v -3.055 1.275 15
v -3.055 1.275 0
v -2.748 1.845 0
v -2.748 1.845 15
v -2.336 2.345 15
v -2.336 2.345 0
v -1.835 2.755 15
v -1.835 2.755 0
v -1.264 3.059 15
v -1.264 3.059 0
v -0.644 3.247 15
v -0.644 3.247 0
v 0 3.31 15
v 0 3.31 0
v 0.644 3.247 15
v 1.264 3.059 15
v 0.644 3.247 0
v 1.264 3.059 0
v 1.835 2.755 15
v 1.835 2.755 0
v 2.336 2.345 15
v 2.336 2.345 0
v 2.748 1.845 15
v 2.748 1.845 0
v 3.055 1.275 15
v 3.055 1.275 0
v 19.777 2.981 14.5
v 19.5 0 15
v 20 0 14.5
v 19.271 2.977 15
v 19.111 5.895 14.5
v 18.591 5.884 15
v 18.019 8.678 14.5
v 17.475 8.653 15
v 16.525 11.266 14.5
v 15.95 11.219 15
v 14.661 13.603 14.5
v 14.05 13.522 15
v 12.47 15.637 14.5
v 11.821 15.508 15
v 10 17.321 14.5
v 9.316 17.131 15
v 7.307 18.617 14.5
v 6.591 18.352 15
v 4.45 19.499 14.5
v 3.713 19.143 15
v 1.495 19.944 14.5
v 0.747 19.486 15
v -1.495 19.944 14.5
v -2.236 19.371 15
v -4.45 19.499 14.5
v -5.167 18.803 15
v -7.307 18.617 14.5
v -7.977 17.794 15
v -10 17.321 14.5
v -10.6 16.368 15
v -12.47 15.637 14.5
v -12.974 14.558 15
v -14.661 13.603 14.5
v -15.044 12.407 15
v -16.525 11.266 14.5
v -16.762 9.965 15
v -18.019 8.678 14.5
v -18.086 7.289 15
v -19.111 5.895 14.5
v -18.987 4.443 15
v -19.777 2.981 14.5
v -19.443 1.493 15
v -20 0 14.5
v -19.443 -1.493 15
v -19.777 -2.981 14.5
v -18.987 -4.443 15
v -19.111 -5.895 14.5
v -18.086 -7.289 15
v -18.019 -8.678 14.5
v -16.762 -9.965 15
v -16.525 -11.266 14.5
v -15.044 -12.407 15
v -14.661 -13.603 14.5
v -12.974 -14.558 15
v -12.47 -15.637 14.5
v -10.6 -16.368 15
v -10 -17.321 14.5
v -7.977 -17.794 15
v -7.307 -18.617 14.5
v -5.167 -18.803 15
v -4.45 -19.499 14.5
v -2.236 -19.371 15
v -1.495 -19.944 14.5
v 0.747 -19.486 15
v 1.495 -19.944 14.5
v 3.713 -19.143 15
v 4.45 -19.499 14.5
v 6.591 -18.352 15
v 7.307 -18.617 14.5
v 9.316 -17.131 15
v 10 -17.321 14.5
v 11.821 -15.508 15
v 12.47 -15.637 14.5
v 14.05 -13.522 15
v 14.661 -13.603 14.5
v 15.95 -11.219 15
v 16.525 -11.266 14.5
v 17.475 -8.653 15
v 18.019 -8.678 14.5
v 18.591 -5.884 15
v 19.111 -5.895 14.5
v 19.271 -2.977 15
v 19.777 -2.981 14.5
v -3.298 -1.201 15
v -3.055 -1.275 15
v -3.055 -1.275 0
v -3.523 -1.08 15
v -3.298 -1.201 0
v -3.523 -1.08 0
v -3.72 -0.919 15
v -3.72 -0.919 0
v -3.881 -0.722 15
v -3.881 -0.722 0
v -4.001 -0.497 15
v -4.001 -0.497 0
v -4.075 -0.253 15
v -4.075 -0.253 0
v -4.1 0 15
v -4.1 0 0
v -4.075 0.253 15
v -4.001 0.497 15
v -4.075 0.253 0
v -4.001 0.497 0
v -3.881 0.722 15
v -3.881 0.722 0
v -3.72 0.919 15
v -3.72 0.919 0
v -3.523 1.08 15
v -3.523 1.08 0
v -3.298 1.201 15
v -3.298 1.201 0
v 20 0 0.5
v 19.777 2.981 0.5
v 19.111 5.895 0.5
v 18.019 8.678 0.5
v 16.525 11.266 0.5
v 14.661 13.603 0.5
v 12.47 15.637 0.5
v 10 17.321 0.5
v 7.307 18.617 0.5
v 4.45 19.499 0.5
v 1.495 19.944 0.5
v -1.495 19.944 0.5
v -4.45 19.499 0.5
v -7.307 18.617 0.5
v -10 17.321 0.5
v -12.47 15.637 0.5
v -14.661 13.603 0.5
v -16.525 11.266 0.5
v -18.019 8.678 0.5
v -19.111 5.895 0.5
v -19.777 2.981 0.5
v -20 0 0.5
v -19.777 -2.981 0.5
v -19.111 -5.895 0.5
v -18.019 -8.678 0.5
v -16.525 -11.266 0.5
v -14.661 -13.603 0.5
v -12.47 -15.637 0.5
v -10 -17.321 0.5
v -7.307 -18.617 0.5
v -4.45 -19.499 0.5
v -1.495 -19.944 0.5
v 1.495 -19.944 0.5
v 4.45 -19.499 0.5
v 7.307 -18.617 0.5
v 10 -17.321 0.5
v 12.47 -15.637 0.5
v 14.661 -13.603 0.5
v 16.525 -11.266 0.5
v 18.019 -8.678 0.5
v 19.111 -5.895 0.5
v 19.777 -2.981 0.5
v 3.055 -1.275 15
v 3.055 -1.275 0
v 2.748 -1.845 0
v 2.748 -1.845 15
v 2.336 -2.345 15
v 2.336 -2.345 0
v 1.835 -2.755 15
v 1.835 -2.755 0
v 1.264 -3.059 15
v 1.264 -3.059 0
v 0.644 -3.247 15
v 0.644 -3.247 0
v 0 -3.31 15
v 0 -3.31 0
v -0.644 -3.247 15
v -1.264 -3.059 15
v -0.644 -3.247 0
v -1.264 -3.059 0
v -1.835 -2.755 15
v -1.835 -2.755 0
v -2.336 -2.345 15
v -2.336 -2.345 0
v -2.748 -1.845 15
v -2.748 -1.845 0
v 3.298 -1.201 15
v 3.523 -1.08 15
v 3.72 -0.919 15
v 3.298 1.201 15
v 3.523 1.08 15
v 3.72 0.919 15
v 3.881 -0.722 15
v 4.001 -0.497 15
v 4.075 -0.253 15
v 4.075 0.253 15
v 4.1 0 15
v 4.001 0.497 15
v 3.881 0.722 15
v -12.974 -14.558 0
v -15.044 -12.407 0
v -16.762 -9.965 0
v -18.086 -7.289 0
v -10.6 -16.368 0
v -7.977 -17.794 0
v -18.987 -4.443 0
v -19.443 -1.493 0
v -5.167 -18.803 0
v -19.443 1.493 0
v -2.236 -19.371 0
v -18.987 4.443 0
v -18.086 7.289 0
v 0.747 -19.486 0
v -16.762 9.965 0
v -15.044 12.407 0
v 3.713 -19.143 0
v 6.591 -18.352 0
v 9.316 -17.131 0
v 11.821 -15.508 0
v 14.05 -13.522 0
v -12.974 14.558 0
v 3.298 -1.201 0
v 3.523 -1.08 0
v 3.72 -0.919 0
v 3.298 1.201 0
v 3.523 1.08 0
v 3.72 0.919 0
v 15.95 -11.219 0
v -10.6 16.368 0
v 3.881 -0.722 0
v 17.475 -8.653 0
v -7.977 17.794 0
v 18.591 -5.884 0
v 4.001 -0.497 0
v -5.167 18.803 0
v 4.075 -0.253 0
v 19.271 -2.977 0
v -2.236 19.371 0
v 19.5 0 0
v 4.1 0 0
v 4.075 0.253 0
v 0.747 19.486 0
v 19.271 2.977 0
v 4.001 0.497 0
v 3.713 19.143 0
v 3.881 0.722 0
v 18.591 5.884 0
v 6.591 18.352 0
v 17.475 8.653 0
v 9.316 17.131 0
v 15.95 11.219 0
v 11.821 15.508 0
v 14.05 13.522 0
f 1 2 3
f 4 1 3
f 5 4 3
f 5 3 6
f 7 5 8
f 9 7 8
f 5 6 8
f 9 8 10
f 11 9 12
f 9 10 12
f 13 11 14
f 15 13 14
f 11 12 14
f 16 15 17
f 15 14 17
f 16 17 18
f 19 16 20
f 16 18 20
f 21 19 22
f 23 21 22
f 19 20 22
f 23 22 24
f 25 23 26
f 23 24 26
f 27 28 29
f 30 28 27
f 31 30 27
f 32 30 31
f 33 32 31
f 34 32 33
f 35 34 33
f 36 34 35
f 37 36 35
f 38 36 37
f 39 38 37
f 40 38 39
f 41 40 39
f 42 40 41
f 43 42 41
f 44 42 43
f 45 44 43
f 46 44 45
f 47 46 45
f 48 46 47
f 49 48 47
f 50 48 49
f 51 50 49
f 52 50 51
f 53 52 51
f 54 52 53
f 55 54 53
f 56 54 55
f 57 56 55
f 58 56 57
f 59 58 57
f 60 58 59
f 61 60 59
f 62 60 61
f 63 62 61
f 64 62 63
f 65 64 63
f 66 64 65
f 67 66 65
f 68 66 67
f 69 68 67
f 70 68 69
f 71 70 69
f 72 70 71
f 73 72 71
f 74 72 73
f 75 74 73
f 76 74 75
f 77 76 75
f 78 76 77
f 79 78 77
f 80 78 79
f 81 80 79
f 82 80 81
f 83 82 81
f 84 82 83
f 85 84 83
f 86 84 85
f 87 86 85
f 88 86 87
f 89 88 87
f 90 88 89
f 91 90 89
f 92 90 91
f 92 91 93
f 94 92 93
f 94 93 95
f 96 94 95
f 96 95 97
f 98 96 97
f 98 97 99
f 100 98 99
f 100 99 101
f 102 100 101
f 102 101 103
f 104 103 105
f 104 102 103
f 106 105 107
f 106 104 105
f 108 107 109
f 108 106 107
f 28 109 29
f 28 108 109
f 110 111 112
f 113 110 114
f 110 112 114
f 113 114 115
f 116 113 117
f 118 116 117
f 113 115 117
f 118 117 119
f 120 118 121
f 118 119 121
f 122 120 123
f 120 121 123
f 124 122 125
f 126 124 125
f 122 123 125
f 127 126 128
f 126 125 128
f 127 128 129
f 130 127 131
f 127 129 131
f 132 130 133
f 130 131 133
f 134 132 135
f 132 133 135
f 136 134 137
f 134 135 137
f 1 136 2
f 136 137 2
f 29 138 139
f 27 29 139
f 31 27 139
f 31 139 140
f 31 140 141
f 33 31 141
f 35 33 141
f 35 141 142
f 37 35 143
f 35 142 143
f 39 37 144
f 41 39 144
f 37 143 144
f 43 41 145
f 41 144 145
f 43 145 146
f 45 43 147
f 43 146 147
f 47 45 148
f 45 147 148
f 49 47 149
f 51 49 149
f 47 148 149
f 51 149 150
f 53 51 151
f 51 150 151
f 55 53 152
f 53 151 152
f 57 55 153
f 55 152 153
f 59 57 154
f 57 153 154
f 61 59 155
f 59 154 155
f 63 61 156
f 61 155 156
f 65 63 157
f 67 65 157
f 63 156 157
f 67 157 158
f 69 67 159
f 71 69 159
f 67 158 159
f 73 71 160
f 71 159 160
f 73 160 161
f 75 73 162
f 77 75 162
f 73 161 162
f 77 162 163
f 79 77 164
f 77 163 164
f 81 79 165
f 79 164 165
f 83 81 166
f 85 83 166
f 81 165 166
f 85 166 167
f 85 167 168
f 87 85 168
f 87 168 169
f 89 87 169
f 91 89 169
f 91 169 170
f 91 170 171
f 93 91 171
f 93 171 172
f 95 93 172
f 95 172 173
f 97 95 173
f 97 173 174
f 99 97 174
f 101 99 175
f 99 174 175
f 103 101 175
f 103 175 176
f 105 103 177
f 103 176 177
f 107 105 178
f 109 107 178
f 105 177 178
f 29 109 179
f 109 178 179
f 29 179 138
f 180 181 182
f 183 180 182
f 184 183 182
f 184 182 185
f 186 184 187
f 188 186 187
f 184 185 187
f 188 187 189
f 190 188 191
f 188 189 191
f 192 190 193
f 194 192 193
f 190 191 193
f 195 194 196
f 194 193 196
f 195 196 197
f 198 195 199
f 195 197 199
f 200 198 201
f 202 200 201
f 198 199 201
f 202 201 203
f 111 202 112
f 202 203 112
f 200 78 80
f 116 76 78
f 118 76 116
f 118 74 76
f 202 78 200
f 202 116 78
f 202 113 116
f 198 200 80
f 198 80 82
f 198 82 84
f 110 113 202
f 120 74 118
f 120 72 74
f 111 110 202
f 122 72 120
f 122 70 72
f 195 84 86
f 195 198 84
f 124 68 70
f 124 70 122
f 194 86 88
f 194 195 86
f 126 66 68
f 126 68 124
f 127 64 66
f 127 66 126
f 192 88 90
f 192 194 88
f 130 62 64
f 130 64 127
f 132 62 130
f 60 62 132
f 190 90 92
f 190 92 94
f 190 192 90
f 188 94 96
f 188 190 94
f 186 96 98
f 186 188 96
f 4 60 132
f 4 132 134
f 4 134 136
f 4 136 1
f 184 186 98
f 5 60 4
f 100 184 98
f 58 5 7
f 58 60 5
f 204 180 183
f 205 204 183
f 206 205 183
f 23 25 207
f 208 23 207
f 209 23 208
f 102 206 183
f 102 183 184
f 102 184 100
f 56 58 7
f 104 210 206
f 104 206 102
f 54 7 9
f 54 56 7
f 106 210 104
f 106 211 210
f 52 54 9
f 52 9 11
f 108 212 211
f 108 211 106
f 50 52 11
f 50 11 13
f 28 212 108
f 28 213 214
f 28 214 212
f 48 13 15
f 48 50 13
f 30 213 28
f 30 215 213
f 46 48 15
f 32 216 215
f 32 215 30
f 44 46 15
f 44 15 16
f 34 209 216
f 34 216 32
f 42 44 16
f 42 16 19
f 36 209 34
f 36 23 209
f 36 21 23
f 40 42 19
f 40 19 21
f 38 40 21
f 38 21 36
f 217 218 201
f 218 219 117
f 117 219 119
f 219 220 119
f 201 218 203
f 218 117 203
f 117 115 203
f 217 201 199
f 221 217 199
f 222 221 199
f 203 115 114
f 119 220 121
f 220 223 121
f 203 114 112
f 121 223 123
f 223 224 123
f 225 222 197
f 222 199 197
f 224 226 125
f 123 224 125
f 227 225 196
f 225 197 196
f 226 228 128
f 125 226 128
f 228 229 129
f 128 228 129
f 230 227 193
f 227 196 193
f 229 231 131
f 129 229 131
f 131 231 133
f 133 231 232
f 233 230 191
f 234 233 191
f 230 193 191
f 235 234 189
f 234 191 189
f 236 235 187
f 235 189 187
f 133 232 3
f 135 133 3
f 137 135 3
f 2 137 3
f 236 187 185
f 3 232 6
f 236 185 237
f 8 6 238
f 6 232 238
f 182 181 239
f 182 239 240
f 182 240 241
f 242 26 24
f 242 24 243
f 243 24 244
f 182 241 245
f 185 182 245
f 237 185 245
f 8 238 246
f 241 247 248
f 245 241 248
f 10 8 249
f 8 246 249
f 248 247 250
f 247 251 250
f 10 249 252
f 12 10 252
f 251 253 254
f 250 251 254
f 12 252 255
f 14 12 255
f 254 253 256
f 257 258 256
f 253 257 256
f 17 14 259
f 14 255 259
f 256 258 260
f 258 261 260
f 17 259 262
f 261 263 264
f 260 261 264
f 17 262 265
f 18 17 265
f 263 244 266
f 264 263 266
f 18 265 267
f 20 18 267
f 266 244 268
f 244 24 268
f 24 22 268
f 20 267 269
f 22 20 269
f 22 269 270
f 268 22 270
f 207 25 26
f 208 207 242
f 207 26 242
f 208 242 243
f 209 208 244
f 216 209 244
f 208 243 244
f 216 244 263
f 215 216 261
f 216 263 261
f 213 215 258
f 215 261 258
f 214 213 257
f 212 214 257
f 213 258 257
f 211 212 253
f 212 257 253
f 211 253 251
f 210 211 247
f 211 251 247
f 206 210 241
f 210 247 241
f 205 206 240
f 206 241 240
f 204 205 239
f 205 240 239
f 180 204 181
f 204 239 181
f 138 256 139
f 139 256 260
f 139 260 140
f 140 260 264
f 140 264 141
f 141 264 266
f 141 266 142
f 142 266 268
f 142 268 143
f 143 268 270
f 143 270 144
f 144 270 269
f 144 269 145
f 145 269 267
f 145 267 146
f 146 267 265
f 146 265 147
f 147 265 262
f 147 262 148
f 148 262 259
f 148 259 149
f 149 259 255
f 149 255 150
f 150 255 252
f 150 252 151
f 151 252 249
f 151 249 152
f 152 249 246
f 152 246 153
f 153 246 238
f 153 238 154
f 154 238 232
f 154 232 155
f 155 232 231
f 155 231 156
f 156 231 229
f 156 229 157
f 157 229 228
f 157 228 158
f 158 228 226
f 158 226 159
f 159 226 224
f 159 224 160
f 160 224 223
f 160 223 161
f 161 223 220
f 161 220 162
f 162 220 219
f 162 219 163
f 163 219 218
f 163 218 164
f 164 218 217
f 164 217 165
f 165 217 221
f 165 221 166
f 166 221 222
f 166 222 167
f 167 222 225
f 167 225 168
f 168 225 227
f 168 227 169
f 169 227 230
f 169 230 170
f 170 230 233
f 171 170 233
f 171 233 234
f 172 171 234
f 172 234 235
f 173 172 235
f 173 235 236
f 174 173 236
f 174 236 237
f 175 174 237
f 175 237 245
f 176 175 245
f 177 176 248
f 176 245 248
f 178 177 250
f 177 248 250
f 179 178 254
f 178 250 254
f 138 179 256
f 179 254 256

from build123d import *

# Parameters (mm, degrees)
F0_R     = 20
F1_DEPTH = 15
F2_SIZE  = 0.5


with BuildPart() as f1:
    # F0 (on Top) → F1 (new body)
    with BuildSketch(Plane.XY):
        Circle(F0_R)
        with BuildLine():
            ThreePointArc((3.054661, -1.274813), (0, -3.31), (-3.054661, -1.274813))
            ThreePointArc((-3.054661, -1.274813), (-4.1, 0), (-3.054661, 1.274813))
            ThreePointArc((-3.054661, 1.274813), (0, 3.31), (3.054661, 1.274813))
            ThreePointArc((3.054661, 1.274813), (4.1, 0), (3.054661, -1.274813))
        make_face(mode=Mode.SUBTRACT)
    extrude(amount=F1_DEPTH)

    # F2
    f2_edges = [f1.edges().sort_by_distance(p)[0] for p in [
        (-20, 0, 15),
        (-20, 0, 0),
    ]]
    chamfer(f2_edges, length=F2_SIZE)


solid = f1.part
